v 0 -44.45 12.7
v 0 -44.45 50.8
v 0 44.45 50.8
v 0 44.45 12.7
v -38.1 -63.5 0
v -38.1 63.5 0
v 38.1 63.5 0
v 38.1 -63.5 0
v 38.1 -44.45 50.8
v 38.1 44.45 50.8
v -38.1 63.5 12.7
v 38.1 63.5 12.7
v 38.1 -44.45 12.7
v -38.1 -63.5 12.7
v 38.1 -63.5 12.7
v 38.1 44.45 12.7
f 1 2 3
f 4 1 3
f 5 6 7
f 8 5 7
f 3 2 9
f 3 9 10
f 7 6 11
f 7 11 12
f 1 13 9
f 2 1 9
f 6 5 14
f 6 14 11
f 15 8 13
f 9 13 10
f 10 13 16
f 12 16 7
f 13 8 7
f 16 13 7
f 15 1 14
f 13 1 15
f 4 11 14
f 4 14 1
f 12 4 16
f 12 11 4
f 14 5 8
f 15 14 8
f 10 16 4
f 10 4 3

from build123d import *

# Parameters (mm, degrees)
F0_W     = 76.2
F0_H     = 127
F1_DEPTH = 12.7
F2_W     = 88.9
F2_H     = 38.1
F3_DEPTH = 38.1


with BuildPart() as f1:
    # F0 (on Top) → F1 (new body)
    with BuildSketch(Plane.XY):
        Rectangle(F0_W, F0_H)
    extrude(amount=F1_DEPTH)

    # F2 (on Right) → F3 (join)
    with BuildSketch(Plane.YZ):
        with Locations((0, 31.75)):
            Rectangle(F2_W, F2_H)
    extrude(amount=F3_DEPTH)


solid = f1.part
